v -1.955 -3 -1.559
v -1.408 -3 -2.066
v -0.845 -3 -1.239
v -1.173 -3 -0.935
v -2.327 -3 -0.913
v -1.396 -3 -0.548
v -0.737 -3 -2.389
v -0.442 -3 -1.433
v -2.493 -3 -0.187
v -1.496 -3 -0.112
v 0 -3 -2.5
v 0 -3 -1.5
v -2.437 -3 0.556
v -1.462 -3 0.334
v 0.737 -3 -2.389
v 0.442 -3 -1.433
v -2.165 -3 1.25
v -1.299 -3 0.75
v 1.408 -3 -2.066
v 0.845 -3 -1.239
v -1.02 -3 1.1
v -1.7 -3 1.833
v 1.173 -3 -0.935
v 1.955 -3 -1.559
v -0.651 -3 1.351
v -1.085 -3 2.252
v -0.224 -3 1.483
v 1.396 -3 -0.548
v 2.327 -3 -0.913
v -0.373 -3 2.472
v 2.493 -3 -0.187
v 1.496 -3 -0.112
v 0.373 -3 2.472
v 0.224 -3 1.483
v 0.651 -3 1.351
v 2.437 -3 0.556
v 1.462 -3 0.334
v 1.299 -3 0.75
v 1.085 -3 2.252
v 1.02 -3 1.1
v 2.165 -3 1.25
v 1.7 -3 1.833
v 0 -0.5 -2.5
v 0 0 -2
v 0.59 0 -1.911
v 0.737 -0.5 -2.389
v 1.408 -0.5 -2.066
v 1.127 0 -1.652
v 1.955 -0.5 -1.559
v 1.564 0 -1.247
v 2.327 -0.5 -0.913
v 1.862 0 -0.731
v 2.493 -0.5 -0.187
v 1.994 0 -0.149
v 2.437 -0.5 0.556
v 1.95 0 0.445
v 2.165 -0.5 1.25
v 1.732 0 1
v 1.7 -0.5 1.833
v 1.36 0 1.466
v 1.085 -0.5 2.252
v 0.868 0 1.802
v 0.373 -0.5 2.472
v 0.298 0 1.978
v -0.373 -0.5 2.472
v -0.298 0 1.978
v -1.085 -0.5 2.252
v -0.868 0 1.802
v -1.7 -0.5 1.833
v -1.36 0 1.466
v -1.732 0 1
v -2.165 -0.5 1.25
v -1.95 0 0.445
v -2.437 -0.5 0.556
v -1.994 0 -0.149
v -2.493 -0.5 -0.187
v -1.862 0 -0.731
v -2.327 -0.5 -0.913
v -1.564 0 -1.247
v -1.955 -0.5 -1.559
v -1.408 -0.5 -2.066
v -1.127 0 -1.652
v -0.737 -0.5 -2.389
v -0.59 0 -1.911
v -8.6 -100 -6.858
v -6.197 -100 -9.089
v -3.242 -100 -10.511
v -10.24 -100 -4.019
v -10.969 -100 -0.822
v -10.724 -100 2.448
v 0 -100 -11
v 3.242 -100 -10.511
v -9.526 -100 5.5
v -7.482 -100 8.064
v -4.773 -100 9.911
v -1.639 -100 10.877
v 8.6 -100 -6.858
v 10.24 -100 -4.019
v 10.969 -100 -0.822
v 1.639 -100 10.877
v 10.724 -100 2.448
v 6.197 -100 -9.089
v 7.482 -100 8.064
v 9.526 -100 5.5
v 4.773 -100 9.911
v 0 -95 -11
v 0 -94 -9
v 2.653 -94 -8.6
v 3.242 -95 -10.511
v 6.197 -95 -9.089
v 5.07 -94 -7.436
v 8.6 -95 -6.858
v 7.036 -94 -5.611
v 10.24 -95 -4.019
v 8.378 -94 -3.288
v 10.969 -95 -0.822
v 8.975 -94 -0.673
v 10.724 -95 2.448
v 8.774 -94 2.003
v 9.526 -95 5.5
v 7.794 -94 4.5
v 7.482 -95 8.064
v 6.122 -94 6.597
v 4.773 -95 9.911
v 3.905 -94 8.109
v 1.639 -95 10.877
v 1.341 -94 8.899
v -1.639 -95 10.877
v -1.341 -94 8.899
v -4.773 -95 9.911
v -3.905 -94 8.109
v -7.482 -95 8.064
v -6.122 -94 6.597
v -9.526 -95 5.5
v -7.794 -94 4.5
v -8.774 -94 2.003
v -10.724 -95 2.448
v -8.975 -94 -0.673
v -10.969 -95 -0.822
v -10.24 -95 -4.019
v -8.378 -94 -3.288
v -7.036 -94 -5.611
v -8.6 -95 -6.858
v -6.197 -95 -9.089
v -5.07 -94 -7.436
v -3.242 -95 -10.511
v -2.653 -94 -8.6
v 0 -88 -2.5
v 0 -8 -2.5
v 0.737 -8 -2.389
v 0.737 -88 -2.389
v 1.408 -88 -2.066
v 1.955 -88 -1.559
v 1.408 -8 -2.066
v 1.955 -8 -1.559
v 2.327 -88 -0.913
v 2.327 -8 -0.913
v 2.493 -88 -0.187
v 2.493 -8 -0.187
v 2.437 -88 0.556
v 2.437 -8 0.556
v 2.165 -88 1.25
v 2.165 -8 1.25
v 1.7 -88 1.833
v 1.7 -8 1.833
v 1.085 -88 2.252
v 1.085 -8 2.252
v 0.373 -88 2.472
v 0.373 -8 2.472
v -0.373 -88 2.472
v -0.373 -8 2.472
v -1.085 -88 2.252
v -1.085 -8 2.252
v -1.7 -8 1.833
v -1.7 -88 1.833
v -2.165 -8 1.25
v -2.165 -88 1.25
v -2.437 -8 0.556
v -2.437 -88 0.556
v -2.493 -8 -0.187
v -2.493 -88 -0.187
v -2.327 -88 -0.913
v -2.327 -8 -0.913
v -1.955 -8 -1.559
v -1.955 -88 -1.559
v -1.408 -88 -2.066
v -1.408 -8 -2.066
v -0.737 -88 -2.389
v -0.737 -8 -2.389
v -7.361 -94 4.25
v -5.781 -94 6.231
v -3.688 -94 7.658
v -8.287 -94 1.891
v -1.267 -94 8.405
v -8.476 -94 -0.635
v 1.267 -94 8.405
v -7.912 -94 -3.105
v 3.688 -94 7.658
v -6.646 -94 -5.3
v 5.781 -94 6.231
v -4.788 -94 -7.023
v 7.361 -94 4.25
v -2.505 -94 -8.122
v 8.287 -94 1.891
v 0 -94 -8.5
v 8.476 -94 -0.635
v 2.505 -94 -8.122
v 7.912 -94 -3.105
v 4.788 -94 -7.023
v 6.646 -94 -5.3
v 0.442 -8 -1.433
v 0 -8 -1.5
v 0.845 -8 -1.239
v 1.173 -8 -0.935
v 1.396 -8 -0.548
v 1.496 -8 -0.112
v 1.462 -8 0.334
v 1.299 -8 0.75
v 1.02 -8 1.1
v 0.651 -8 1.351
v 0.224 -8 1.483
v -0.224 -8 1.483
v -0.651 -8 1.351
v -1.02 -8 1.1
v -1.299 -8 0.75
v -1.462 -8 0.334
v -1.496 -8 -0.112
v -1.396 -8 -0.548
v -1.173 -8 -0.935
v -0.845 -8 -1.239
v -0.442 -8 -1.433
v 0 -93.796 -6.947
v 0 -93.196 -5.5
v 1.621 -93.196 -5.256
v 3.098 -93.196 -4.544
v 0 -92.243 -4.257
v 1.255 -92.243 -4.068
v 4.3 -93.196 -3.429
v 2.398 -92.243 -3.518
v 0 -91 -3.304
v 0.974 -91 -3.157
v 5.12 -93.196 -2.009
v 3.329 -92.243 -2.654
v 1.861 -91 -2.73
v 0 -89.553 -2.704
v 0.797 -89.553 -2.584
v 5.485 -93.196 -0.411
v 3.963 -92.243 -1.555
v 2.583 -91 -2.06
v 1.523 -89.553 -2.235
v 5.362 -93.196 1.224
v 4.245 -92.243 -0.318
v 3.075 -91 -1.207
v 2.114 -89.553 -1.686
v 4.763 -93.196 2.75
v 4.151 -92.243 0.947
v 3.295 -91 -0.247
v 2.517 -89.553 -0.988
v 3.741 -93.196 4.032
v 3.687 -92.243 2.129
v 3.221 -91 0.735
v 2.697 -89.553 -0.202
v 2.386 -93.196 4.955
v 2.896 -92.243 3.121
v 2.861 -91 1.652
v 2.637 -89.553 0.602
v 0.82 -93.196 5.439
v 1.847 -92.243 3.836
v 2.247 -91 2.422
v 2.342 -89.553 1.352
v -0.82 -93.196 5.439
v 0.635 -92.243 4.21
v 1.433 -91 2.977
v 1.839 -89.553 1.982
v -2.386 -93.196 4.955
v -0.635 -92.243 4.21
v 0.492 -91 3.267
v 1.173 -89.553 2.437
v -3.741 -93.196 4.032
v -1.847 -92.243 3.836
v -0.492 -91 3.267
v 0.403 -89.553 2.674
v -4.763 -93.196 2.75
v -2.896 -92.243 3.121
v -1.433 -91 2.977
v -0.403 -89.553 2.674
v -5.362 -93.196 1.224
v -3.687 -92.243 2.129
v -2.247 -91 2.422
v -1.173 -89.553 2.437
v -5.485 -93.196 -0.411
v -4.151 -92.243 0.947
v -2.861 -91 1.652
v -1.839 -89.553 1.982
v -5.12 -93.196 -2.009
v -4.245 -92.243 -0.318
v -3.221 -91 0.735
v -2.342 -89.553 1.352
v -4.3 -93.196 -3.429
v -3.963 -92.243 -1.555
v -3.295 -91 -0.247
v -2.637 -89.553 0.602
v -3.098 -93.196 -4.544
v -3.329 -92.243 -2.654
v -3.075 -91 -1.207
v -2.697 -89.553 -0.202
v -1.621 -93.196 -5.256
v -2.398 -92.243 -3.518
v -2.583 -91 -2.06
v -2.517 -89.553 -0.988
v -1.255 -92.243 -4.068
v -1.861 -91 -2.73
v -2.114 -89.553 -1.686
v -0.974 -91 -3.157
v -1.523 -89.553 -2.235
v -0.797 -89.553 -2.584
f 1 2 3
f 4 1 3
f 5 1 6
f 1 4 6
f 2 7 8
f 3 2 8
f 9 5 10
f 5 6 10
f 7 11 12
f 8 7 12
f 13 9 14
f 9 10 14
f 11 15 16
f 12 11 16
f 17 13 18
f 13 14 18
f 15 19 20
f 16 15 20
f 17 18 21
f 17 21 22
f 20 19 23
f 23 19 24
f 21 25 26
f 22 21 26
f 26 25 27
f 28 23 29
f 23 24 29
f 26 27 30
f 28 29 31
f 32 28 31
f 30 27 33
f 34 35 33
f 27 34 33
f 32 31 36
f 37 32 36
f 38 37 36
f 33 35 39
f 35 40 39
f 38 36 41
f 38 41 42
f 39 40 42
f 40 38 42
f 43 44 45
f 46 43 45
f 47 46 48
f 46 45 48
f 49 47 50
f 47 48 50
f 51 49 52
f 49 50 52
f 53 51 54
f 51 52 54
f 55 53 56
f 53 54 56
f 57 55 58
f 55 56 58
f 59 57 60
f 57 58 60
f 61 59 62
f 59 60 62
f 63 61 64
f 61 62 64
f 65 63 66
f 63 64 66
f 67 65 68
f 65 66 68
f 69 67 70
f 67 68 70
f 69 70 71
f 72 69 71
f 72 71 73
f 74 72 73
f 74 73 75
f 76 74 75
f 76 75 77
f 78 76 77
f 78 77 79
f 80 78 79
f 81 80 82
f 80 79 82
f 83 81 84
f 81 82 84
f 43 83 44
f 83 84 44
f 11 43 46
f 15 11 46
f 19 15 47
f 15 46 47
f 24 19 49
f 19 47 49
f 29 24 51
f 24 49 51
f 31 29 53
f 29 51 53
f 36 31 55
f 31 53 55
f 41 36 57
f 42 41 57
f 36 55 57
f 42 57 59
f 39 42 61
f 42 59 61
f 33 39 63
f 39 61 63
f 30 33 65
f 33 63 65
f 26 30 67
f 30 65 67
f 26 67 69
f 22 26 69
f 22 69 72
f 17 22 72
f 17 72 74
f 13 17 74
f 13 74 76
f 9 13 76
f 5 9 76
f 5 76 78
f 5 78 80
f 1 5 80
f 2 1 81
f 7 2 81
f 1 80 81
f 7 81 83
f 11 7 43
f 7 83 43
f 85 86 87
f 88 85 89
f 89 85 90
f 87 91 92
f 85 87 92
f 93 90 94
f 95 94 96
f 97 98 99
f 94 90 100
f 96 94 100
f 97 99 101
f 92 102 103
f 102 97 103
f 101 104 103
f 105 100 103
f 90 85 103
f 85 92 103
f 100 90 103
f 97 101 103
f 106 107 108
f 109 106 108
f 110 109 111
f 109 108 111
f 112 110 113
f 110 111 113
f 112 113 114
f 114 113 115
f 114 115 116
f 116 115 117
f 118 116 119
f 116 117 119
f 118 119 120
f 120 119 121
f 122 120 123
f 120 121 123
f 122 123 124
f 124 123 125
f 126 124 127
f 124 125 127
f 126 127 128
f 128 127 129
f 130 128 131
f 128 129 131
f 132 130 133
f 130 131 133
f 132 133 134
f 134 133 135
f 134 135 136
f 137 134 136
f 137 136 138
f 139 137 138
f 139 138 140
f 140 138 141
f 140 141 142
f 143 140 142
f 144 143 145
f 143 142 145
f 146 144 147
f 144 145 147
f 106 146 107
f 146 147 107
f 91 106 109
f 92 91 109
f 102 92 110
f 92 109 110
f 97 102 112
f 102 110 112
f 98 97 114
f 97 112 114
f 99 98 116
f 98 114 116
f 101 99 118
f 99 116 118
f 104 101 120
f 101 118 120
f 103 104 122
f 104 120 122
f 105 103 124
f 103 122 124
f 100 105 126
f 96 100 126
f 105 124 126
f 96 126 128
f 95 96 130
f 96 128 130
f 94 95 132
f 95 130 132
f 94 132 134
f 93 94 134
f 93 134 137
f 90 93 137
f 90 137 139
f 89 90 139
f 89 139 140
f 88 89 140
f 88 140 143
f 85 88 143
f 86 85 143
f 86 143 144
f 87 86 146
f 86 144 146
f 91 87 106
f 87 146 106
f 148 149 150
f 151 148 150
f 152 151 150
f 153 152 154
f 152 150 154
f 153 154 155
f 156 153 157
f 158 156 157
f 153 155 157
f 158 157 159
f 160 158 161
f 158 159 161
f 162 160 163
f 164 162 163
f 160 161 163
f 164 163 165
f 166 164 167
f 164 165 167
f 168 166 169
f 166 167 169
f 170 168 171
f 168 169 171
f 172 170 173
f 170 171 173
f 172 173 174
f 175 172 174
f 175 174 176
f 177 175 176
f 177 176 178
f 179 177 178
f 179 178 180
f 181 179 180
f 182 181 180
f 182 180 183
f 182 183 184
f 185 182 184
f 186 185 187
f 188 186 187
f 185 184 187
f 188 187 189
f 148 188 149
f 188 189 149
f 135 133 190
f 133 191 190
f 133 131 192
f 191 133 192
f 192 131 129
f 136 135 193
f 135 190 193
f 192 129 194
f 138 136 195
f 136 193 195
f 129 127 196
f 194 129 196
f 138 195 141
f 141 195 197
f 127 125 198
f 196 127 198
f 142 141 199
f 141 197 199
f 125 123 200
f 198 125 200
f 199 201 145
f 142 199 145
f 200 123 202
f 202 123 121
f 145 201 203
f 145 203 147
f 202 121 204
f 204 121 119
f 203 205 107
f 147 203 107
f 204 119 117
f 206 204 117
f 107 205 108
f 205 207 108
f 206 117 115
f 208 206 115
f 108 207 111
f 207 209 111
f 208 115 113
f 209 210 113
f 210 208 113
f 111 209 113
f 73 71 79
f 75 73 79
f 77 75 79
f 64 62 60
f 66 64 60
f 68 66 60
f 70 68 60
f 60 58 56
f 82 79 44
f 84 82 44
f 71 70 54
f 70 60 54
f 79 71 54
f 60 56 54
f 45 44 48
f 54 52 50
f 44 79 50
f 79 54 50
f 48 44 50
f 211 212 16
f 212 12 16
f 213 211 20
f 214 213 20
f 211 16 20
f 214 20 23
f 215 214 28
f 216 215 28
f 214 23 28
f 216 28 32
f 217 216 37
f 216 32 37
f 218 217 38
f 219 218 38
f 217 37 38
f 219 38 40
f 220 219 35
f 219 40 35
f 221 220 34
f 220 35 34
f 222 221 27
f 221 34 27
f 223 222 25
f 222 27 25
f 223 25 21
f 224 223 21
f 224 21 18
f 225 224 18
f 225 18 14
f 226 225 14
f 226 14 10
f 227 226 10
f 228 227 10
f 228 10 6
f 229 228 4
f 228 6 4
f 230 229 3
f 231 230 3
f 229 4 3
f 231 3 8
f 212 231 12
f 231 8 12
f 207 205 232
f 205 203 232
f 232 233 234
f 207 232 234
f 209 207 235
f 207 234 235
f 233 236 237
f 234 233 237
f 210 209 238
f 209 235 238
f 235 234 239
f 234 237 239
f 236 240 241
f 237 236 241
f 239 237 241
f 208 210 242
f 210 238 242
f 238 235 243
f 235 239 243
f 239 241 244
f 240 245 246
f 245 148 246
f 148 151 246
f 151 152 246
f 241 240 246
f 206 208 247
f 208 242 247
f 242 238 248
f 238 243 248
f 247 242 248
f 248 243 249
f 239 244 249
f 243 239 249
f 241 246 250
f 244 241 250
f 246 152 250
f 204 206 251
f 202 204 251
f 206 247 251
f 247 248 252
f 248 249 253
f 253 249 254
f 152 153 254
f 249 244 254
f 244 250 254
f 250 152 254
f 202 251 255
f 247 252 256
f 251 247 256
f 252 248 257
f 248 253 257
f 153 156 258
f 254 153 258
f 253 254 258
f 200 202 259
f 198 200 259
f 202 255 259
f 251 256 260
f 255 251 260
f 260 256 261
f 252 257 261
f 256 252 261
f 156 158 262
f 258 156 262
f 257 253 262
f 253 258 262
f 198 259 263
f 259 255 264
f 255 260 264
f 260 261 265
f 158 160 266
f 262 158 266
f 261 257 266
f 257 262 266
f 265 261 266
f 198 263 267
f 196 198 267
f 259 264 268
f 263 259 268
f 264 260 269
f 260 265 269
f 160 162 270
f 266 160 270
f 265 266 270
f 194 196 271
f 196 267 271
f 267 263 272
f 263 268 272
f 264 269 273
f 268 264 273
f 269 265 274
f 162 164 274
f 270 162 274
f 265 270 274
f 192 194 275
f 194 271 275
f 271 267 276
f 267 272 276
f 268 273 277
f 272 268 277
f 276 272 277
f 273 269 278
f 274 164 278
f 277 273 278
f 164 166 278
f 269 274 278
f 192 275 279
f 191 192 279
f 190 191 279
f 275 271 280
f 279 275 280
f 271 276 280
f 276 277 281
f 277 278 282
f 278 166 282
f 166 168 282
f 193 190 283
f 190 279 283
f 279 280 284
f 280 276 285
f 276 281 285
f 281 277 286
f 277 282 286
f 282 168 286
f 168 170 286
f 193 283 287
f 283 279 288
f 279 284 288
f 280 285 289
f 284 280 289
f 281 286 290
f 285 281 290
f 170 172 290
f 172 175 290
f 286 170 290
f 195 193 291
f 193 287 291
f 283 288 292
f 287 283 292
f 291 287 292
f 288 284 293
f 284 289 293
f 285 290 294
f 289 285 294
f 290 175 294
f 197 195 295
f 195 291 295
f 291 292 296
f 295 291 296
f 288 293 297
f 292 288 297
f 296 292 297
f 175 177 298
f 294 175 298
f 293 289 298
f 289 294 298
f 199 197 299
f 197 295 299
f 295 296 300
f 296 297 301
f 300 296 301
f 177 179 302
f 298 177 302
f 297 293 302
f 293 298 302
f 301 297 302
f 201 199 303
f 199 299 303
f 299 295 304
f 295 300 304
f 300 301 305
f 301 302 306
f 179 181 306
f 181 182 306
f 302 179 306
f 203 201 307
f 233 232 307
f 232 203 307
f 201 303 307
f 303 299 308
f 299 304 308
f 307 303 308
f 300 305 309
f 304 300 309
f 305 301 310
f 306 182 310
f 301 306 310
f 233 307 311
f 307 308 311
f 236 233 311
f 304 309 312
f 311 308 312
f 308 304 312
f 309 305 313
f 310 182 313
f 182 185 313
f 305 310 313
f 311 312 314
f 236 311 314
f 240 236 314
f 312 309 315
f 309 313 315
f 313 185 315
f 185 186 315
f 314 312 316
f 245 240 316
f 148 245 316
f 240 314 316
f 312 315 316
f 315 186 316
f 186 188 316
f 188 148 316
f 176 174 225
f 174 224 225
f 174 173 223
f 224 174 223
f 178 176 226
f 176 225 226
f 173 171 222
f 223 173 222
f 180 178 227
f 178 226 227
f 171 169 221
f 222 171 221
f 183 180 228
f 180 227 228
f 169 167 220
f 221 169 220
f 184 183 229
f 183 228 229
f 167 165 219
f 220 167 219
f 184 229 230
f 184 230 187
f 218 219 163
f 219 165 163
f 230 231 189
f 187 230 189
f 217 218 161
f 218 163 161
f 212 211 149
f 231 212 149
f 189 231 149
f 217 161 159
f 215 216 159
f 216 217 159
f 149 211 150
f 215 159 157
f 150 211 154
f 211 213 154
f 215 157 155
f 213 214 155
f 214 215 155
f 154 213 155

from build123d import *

# Parameters (mm, degrees)
FILLET1_R      = 6
CHAMFER1_SIZE  = 1
CHAMFER1_SIZE2 = 2
CHAMFER3_SIZE  = 0.5


with BuildPart() as part:
    # Sketch1 → Revolve1 (revolve)
    with BuildSketch(Plane(origin=(0, 0, 0), x_dir=(0, 0, -1), z_dir=(1, 0, 0))):
        Polygon((0, 0), (0, -100), (11, -100), (11, -94), (2.5, -94), (2.5, -8), (1.5, -8), (1.5, -3), (2.5, -3), (2.5, 0), align=None)
    revolve(axis=Axis((0, 0, 0), (0, -1, 0)))

    # Fillet1
    fillet1_edges = [part.edges().sort_by_distance(p)[0] for p in [
        (0, -94, 2.5),
    ]]
    fillet(fillet1_edges, radius=FILLET1_R)

    # Chamfer1
    chamfer1_edges = [part.edges().sort_by_distance(p)[0] for p in [
        (0, -94, 11),
    ]]
    chamfer1_side = [part.faces().sort_by_distance(p)[0] for p in [
        (0, -97, 11),
    ]]
    chamfer(chamfer1_edges, length=CHAMFER1_SIZE, length2=CHAMFER1_SIZE2, reference=chamfer1_side[0])

    # Chamfer3
    chamfer3_edges = [part.edges().sort_by_distance(p)[0] for p in [
        (0, 0, 2.5),
    ]]
    chamfer(chamfer3_edges, length=CHAMFER3_SIZE)


solid = part.part
